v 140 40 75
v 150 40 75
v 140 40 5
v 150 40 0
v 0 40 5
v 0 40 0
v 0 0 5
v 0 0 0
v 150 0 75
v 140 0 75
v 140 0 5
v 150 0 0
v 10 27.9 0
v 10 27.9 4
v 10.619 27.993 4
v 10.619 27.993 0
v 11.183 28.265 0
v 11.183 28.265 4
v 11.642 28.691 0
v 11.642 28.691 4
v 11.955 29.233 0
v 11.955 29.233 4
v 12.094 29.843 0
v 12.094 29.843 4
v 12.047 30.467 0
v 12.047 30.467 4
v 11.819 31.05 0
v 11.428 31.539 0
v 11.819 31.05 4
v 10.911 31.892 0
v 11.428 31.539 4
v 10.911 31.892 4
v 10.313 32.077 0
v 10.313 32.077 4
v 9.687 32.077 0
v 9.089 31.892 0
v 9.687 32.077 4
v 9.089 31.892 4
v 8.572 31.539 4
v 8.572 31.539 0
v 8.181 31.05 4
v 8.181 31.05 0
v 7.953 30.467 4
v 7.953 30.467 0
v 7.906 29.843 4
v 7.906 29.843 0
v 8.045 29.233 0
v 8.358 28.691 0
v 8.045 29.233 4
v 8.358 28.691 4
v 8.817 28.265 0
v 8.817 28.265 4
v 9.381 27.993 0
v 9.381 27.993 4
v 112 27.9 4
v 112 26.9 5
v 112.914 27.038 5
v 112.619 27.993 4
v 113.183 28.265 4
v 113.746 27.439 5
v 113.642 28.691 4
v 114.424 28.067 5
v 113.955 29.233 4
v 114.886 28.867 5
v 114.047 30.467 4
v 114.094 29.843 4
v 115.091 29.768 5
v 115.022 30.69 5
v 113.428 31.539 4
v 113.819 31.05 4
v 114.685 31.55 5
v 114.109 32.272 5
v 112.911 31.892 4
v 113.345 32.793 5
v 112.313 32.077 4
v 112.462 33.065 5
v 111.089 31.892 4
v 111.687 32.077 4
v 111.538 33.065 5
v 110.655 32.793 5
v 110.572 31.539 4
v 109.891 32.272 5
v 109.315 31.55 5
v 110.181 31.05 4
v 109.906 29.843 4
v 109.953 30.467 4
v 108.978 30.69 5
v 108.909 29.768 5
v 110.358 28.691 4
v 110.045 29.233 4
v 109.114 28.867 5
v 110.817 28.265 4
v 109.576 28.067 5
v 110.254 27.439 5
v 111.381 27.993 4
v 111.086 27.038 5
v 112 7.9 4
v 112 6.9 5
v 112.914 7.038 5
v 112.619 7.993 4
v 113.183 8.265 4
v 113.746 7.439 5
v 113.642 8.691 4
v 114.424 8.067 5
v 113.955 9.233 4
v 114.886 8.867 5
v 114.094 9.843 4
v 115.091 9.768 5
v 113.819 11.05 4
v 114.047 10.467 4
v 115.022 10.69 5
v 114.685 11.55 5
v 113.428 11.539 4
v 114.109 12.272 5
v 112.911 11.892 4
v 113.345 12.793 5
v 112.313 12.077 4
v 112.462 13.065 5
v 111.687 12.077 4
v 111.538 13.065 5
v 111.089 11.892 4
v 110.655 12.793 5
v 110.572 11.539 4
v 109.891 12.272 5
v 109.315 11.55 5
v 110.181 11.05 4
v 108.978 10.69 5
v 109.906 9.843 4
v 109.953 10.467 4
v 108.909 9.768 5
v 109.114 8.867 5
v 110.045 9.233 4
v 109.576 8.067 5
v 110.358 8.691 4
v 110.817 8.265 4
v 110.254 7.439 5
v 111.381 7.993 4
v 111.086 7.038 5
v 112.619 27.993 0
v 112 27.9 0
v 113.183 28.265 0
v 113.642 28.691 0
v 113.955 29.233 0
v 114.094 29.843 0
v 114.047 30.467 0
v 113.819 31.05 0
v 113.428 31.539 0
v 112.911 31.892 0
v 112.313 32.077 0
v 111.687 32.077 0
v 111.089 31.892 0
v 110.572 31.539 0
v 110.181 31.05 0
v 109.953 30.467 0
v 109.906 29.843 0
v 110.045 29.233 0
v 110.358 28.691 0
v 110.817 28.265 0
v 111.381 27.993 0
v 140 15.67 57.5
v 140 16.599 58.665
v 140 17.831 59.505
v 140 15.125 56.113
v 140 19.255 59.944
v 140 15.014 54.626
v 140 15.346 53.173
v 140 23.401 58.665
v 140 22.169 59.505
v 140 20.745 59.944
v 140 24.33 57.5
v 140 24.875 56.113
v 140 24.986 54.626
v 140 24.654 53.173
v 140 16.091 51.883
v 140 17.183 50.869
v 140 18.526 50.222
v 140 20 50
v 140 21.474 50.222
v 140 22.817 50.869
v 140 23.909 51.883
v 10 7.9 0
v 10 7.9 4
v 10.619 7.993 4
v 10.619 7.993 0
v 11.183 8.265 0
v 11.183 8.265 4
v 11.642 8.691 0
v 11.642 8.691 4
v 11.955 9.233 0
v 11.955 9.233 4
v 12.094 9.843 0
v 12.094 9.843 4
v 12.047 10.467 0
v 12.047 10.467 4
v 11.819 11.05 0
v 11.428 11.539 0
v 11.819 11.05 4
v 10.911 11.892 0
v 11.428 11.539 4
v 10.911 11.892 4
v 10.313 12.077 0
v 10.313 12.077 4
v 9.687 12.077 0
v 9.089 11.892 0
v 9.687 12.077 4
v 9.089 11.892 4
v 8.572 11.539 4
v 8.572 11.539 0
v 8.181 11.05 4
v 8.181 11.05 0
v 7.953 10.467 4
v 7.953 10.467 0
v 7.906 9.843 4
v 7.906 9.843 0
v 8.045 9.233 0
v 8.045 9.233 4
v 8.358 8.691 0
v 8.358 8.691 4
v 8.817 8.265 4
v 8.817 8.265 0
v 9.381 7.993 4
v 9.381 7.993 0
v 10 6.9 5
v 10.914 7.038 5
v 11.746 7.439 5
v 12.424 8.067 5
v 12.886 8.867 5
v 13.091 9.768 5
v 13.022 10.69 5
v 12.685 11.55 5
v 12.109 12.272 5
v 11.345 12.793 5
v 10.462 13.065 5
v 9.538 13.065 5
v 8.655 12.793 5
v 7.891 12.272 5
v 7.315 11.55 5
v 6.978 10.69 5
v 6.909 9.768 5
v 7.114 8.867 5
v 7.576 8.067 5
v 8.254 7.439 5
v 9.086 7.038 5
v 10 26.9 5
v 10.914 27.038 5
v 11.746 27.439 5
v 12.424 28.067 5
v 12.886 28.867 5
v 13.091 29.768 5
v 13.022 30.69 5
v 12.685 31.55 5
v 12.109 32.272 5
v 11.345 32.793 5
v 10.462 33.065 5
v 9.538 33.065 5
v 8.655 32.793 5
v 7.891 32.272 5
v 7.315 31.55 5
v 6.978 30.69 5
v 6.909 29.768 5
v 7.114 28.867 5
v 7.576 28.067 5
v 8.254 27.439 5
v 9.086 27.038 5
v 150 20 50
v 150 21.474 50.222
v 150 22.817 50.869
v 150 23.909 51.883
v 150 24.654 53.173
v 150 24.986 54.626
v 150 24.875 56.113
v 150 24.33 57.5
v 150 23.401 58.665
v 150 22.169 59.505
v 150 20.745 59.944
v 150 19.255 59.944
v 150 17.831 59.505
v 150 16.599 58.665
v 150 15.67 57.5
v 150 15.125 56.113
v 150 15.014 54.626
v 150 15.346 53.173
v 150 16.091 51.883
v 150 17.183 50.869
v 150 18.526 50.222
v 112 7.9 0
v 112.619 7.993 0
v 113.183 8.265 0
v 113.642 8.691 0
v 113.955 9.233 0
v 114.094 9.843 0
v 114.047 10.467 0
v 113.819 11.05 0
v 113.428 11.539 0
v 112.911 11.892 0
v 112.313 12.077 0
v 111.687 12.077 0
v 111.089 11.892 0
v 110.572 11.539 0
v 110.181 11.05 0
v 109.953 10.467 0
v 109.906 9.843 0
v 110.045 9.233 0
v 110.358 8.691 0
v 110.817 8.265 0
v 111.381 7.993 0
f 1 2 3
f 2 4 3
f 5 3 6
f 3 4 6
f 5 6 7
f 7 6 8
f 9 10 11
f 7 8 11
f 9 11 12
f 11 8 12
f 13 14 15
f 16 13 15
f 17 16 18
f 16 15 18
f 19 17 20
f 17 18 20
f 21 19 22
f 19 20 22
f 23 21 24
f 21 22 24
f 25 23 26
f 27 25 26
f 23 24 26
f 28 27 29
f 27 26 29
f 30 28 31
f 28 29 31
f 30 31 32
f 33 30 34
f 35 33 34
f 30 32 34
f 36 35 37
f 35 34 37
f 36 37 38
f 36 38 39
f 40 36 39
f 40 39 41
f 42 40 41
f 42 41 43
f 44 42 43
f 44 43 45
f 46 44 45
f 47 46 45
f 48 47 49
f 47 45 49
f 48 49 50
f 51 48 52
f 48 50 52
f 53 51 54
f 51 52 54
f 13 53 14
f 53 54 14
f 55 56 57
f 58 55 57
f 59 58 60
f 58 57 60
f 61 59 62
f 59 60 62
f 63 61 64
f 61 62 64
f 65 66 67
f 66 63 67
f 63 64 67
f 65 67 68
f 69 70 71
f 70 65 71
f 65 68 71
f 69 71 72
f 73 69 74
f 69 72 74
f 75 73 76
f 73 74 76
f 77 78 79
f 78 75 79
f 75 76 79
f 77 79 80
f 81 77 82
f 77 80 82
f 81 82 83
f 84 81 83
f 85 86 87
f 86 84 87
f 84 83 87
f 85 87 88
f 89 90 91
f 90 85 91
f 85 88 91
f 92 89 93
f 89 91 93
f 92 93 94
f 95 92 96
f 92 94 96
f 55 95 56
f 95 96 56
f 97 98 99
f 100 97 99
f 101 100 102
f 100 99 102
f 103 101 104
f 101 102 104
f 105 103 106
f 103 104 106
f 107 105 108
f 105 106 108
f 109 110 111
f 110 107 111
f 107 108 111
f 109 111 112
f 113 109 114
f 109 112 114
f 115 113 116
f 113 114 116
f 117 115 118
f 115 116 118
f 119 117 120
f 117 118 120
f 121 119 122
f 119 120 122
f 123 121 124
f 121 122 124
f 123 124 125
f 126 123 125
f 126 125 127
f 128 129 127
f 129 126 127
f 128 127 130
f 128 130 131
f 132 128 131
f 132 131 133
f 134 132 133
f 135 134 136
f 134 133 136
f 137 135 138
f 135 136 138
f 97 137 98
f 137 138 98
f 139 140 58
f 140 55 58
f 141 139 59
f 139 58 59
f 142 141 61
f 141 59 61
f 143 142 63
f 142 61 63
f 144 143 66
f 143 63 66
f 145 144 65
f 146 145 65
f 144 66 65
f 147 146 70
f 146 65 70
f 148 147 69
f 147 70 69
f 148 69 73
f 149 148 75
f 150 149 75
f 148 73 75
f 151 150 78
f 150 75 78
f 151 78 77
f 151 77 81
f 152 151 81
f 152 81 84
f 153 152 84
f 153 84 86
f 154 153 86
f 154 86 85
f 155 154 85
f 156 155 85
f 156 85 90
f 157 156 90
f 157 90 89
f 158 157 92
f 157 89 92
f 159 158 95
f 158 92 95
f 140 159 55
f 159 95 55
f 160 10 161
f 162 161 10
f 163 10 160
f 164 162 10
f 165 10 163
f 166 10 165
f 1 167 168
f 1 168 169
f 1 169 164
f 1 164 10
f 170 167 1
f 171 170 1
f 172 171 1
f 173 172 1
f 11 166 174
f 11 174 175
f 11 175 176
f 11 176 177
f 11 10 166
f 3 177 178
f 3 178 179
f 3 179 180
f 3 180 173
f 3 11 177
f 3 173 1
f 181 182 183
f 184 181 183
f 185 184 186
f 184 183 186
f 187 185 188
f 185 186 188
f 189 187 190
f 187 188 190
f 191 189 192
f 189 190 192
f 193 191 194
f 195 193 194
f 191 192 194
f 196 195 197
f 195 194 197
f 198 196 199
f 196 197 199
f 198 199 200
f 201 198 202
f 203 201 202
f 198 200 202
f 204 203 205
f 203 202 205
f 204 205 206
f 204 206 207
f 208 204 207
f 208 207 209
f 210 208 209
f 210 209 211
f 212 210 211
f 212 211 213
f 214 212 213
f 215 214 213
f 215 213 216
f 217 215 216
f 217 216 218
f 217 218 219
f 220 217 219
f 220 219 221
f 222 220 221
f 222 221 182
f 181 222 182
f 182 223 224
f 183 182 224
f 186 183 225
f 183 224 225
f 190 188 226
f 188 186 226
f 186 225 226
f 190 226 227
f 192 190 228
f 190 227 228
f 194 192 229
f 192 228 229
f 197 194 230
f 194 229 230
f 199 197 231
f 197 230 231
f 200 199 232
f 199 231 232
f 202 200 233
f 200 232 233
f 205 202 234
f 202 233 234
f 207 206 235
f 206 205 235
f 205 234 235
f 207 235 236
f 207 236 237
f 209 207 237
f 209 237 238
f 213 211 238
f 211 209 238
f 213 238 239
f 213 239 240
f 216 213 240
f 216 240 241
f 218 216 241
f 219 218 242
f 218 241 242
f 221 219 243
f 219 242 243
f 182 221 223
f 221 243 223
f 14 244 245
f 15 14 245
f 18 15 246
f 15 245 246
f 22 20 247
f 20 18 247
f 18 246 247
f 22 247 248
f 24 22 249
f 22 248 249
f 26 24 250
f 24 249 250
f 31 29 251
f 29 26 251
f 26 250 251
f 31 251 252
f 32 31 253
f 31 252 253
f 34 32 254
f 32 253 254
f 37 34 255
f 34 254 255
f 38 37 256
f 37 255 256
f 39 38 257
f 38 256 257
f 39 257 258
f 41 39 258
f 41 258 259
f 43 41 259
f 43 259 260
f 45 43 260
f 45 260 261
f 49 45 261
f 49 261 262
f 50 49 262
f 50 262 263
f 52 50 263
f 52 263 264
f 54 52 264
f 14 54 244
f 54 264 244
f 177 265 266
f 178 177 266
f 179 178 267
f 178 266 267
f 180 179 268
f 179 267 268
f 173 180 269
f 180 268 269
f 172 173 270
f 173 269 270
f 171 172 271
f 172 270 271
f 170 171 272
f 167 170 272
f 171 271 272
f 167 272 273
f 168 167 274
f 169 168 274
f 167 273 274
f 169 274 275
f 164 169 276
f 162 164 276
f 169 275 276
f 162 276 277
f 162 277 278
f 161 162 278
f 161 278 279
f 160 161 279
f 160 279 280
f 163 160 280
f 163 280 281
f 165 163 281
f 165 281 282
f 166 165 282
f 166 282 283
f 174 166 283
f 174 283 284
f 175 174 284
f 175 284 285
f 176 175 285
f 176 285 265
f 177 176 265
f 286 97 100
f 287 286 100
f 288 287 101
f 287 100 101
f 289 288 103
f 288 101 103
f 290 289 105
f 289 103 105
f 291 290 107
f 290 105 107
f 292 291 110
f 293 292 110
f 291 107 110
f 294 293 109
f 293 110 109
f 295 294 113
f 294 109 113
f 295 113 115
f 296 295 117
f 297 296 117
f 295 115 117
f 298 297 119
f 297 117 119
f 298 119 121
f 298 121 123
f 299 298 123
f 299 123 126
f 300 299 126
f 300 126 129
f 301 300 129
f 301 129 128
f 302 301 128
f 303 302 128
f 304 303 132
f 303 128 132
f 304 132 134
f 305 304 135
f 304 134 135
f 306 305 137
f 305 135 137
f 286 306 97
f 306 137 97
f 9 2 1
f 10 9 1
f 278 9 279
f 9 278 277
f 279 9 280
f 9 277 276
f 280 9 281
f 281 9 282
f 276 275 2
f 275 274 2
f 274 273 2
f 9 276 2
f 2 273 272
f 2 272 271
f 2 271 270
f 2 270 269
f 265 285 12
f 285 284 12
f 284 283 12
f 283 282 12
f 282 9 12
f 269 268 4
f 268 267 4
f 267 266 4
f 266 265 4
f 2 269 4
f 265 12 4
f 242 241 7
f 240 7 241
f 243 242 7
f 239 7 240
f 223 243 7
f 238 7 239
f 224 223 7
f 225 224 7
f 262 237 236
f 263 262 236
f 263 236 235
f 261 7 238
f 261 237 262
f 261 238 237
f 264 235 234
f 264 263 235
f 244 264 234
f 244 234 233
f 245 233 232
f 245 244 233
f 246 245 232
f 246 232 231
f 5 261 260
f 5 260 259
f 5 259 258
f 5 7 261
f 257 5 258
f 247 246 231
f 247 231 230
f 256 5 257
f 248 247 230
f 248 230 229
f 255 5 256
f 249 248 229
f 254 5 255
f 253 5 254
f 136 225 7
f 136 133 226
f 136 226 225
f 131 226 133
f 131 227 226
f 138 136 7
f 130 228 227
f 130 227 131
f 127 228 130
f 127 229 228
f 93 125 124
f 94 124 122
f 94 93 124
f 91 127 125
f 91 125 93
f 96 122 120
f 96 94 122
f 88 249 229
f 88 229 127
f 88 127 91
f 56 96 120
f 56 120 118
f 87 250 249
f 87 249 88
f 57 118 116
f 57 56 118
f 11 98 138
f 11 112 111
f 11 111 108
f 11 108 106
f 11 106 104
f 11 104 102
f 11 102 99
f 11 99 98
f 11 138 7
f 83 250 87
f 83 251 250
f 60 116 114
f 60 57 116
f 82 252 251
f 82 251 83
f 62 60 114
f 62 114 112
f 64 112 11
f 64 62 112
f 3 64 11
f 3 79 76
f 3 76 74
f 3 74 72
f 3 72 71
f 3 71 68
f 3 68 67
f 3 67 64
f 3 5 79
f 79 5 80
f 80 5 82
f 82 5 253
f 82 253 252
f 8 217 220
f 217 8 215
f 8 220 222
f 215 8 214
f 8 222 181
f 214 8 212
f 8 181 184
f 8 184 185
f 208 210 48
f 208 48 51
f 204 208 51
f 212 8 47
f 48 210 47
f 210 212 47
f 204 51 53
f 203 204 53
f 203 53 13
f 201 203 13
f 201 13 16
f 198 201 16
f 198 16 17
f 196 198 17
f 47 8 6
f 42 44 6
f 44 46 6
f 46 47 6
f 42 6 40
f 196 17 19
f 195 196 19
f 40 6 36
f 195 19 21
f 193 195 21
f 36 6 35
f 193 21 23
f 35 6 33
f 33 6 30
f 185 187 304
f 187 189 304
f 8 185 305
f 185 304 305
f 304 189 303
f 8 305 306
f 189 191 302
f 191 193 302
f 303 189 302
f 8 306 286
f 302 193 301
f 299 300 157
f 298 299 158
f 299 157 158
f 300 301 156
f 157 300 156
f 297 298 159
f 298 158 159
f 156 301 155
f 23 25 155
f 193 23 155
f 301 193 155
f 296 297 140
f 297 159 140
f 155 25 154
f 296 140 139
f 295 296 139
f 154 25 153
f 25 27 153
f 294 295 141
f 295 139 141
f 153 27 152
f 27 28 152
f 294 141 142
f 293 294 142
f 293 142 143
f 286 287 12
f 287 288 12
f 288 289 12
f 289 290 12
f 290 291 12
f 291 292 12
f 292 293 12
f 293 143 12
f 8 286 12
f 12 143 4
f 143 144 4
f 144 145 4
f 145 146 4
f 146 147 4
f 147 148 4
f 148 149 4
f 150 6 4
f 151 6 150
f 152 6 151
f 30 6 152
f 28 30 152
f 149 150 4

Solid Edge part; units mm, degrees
sketch "Sketch1" plane through (0, 0, 0) normal (0, 0, 1) x (1, 0, 0)
  line L0 (150, 0) -> (150, 40)
  line L1 (150, 40) -> (0, 40)
  line L2 (0, 40) -> (0, 0)
  line L3 (0, 0) -> (150, 0)
extrude "Protrusion1" add sketch "Sketch1" along normal blind 5
sketch "Sketch2" plane through (75, 20, 5) normal (0, 0, 1) x (1, 0, 0)
  line L0 (65, 20) -> (75, 20)
  line L1 (75, 20) -> (75, -20)
  line L2 (75, -20) -> (65, -20)
  line L3 (65, -20) -> (65, 20)
extrude "Extrusionsausprägung_2" add sketch "Sketch2" along normal blind 70
hole "Bohrung_1" at (10, 30, 5) direction (0, 0, -1) diameter 4.2 end up to next start chamfer 1 start chamfer angle 45
hole "Hole1" at (10, 10, 5) direction (0, 0, -1) diameter 4.2 end up to next start chamfer 1 start chamfer angle 45
hole "Hole2" at (112, 10, 5) direction (0, 0, -1) diameter 4.2 end up to next start chamfer 1 start chamfer angle 45
hole "Hole3" at (112, 30, 5) direction (0, 0, -1) diameter 4.2 end up to next start chamfer 1 start chamfer angle 45
hole "Bohrung_6" at (150, 20, 55) direction (-1, 0, 0) diameter 10 end up to next
